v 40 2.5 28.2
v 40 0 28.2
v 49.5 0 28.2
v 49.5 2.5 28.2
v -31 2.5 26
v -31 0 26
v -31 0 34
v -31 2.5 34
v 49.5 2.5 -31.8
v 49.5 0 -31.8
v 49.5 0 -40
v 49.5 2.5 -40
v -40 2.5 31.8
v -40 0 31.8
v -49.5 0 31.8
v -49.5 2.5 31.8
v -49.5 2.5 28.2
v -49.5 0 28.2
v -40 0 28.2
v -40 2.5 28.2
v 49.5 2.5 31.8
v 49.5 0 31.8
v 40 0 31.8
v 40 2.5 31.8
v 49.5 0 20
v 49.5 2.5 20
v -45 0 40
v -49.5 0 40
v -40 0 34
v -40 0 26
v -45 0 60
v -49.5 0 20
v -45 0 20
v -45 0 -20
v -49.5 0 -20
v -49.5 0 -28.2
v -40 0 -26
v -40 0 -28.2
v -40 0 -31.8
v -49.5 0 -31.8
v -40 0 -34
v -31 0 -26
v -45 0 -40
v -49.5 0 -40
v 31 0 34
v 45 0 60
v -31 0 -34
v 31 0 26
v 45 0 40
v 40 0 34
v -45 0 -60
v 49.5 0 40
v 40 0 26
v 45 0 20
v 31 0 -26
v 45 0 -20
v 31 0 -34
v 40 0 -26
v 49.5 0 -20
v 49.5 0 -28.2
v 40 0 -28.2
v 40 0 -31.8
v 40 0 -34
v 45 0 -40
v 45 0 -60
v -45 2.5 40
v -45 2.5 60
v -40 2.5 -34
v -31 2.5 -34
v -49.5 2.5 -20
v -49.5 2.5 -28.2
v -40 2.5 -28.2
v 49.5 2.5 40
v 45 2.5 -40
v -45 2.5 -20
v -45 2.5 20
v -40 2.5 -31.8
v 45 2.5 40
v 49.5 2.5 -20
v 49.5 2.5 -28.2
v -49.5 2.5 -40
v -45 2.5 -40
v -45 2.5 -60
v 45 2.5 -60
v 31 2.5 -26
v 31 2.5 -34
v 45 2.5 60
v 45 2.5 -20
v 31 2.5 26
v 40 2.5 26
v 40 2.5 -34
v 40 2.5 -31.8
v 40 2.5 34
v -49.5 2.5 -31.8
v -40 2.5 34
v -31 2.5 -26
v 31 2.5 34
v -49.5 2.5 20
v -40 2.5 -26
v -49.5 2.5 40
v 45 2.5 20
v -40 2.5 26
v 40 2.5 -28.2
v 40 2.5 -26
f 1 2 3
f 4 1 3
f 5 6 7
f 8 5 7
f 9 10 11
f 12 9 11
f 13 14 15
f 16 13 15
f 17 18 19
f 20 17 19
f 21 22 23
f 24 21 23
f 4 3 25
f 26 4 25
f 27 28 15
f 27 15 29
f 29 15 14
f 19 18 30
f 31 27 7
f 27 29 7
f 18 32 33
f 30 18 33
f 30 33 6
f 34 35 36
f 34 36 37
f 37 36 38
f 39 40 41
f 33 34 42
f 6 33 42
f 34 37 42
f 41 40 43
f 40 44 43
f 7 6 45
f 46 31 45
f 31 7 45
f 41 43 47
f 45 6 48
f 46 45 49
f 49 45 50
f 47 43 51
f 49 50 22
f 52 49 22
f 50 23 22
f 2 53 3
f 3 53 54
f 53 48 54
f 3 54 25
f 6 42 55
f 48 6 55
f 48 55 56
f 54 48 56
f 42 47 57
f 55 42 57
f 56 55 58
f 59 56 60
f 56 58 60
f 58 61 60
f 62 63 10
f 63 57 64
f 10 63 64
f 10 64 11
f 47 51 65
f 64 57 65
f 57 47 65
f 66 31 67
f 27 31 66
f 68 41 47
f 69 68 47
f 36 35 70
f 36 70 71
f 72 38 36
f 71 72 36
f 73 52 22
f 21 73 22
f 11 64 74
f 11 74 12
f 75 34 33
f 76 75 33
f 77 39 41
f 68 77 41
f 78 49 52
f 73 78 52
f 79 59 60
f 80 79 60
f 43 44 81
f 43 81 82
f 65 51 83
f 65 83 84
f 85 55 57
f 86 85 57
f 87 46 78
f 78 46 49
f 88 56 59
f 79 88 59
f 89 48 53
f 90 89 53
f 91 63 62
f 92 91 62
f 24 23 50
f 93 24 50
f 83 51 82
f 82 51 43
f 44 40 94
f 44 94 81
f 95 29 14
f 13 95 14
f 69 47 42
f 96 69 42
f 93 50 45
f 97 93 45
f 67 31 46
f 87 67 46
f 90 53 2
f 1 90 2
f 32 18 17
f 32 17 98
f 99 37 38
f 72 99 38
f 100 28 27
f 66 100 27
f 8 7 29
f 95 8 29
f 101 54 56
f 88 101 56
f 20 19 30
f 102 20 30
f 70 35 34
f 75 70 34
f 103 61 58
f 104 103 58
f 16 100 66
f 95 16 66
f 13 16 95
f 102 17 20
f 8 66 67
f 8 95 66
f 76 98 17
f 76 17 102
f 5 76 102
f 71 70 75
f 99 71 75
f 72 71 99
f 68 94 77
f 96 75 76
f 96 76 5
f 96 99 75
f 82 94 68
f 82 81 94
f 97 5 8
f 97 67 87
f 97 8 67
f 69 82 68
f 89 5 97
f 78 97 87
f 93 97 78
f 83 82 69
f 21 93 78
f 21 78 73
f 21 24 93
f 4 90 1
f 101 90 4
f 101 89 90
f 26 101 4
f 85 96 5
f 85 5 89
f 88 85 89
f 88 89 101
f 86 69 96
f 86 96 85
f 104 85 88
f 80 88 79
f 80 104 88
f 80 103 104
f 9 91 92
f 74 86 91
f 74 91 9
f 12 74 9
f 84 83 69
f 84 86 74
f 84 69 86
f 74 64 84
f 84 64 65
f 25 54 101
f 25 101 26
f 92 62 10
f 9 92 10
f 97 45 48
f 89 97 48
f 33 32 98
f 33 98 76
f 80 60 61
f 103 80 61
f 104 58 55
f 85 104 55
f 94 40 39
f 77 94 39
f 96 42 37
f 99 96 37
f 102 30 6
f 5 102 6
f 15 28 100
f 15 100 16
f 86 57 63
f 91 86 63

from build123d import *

# Parameters (mm, degrees)
SKETCH1_W           = 90
SKETCH1_H           = 20
SKETCH1_W_2         = 4.5
SKETCH1_H_2         = 8.2
SKETCH1_W_3         = 62
SKETCH1_H_3         = 3.6
SKETCH1_H_4         = 40
BOSS_EXTRUDE1_DEPTH = 2.5


with BuildPart() as part:
    # Sketch1 → Boss-Extrude1 (new body)
    with BuildSketch(Plane(origin=(0, 0, 0), x_dir=(1, 0, 0), z_dir=(0, 1, 0))):
        with Locations((0, 50)):
            Rectangle(SKETCH1_W, SKETCH1_H)
        Polygon((-45, 40), (-45, 31.8), (-40, 31.8), (-40, 34), (-31, 34), (-31, 31.8), (31, 31.8), (31, 34), (40, 34), (40, 31.8), (45, 31.8), (45, 40), align=None)
        with Locations((-47.25, 35.9)):
            Rectangle(SKETCH1_W_2, SKETCH1_H_2)
        with Locations((-47.25, 24.1)):
            Rectangle(SKETCH1_W_2, SKETCH1_H_2)
        Polygon((-45, 28.2), (-45, 20), (45, 20), (45, 28.2), (40, 28.2), (40, 26), (31, 26), (31, 28.2), (-31, 28.2), (-31, 26), (-40, 26), (-40, 28.2), align=None)
        with Locations((0, 30)):
            Rectangle(SKETCH1_W_3, SKETCH1_H_3)
        Rectangle(SKETCH1_W, SKETCH1_H_4)
        Polygon((-45, -20), (-45, -28.2), (-40, -28.2), (-40, -26), (-31, -26), (-31, -28.2), (31, -28.2), (31, -26), (40, -26), (40, -28.2), (45, -28.2), (45, -20), align=None)
        with Locations((-47.25, -24.1)):
            Rectangle(SKETCH1_W_2, SKETCH1_H_2)
        with Locations((-47.25, -35.9)):
            Rectangle(SKETCH1_W_2, SKETCH1_H_2)
        Polygon((-45, -31.8), (-45, -40), (45, -40), (45, -31.8), (40, -31.8), (40, -34), (31, -34), (31, -31.8), (-31, -31.8), (-31, -34), (-40, -34), (-40, -31.8), align=None)
        with Locations((0, -30)):
            Rectangle(SKETCH1_W_3, SKETCH1_H_3)
        with Locations((47.25, -24.1)):
            Rectangle(SKETCH1_W_2, SKETCH1_H_2)
        with Locations((47.25, -35.9)):
            Rectangle(SKETCH1_W_2, SKETCH1_H_2)
        with Locations((47.25, 24.1)):
            Rectangle(SKETCH1_W_2, SKETCH1_H_2)
        with Locations((47.25, 35.9)):
            Rectangle(SKETCH1_W_2, SKETCH1_H_2)
        with Locations((0, -50)):
            Rectangle(SKETCH1_W, SKETCH1_H)
    extrude(amount=BOSS_EXTRUDE1_DEPTH)


solid = part.part
